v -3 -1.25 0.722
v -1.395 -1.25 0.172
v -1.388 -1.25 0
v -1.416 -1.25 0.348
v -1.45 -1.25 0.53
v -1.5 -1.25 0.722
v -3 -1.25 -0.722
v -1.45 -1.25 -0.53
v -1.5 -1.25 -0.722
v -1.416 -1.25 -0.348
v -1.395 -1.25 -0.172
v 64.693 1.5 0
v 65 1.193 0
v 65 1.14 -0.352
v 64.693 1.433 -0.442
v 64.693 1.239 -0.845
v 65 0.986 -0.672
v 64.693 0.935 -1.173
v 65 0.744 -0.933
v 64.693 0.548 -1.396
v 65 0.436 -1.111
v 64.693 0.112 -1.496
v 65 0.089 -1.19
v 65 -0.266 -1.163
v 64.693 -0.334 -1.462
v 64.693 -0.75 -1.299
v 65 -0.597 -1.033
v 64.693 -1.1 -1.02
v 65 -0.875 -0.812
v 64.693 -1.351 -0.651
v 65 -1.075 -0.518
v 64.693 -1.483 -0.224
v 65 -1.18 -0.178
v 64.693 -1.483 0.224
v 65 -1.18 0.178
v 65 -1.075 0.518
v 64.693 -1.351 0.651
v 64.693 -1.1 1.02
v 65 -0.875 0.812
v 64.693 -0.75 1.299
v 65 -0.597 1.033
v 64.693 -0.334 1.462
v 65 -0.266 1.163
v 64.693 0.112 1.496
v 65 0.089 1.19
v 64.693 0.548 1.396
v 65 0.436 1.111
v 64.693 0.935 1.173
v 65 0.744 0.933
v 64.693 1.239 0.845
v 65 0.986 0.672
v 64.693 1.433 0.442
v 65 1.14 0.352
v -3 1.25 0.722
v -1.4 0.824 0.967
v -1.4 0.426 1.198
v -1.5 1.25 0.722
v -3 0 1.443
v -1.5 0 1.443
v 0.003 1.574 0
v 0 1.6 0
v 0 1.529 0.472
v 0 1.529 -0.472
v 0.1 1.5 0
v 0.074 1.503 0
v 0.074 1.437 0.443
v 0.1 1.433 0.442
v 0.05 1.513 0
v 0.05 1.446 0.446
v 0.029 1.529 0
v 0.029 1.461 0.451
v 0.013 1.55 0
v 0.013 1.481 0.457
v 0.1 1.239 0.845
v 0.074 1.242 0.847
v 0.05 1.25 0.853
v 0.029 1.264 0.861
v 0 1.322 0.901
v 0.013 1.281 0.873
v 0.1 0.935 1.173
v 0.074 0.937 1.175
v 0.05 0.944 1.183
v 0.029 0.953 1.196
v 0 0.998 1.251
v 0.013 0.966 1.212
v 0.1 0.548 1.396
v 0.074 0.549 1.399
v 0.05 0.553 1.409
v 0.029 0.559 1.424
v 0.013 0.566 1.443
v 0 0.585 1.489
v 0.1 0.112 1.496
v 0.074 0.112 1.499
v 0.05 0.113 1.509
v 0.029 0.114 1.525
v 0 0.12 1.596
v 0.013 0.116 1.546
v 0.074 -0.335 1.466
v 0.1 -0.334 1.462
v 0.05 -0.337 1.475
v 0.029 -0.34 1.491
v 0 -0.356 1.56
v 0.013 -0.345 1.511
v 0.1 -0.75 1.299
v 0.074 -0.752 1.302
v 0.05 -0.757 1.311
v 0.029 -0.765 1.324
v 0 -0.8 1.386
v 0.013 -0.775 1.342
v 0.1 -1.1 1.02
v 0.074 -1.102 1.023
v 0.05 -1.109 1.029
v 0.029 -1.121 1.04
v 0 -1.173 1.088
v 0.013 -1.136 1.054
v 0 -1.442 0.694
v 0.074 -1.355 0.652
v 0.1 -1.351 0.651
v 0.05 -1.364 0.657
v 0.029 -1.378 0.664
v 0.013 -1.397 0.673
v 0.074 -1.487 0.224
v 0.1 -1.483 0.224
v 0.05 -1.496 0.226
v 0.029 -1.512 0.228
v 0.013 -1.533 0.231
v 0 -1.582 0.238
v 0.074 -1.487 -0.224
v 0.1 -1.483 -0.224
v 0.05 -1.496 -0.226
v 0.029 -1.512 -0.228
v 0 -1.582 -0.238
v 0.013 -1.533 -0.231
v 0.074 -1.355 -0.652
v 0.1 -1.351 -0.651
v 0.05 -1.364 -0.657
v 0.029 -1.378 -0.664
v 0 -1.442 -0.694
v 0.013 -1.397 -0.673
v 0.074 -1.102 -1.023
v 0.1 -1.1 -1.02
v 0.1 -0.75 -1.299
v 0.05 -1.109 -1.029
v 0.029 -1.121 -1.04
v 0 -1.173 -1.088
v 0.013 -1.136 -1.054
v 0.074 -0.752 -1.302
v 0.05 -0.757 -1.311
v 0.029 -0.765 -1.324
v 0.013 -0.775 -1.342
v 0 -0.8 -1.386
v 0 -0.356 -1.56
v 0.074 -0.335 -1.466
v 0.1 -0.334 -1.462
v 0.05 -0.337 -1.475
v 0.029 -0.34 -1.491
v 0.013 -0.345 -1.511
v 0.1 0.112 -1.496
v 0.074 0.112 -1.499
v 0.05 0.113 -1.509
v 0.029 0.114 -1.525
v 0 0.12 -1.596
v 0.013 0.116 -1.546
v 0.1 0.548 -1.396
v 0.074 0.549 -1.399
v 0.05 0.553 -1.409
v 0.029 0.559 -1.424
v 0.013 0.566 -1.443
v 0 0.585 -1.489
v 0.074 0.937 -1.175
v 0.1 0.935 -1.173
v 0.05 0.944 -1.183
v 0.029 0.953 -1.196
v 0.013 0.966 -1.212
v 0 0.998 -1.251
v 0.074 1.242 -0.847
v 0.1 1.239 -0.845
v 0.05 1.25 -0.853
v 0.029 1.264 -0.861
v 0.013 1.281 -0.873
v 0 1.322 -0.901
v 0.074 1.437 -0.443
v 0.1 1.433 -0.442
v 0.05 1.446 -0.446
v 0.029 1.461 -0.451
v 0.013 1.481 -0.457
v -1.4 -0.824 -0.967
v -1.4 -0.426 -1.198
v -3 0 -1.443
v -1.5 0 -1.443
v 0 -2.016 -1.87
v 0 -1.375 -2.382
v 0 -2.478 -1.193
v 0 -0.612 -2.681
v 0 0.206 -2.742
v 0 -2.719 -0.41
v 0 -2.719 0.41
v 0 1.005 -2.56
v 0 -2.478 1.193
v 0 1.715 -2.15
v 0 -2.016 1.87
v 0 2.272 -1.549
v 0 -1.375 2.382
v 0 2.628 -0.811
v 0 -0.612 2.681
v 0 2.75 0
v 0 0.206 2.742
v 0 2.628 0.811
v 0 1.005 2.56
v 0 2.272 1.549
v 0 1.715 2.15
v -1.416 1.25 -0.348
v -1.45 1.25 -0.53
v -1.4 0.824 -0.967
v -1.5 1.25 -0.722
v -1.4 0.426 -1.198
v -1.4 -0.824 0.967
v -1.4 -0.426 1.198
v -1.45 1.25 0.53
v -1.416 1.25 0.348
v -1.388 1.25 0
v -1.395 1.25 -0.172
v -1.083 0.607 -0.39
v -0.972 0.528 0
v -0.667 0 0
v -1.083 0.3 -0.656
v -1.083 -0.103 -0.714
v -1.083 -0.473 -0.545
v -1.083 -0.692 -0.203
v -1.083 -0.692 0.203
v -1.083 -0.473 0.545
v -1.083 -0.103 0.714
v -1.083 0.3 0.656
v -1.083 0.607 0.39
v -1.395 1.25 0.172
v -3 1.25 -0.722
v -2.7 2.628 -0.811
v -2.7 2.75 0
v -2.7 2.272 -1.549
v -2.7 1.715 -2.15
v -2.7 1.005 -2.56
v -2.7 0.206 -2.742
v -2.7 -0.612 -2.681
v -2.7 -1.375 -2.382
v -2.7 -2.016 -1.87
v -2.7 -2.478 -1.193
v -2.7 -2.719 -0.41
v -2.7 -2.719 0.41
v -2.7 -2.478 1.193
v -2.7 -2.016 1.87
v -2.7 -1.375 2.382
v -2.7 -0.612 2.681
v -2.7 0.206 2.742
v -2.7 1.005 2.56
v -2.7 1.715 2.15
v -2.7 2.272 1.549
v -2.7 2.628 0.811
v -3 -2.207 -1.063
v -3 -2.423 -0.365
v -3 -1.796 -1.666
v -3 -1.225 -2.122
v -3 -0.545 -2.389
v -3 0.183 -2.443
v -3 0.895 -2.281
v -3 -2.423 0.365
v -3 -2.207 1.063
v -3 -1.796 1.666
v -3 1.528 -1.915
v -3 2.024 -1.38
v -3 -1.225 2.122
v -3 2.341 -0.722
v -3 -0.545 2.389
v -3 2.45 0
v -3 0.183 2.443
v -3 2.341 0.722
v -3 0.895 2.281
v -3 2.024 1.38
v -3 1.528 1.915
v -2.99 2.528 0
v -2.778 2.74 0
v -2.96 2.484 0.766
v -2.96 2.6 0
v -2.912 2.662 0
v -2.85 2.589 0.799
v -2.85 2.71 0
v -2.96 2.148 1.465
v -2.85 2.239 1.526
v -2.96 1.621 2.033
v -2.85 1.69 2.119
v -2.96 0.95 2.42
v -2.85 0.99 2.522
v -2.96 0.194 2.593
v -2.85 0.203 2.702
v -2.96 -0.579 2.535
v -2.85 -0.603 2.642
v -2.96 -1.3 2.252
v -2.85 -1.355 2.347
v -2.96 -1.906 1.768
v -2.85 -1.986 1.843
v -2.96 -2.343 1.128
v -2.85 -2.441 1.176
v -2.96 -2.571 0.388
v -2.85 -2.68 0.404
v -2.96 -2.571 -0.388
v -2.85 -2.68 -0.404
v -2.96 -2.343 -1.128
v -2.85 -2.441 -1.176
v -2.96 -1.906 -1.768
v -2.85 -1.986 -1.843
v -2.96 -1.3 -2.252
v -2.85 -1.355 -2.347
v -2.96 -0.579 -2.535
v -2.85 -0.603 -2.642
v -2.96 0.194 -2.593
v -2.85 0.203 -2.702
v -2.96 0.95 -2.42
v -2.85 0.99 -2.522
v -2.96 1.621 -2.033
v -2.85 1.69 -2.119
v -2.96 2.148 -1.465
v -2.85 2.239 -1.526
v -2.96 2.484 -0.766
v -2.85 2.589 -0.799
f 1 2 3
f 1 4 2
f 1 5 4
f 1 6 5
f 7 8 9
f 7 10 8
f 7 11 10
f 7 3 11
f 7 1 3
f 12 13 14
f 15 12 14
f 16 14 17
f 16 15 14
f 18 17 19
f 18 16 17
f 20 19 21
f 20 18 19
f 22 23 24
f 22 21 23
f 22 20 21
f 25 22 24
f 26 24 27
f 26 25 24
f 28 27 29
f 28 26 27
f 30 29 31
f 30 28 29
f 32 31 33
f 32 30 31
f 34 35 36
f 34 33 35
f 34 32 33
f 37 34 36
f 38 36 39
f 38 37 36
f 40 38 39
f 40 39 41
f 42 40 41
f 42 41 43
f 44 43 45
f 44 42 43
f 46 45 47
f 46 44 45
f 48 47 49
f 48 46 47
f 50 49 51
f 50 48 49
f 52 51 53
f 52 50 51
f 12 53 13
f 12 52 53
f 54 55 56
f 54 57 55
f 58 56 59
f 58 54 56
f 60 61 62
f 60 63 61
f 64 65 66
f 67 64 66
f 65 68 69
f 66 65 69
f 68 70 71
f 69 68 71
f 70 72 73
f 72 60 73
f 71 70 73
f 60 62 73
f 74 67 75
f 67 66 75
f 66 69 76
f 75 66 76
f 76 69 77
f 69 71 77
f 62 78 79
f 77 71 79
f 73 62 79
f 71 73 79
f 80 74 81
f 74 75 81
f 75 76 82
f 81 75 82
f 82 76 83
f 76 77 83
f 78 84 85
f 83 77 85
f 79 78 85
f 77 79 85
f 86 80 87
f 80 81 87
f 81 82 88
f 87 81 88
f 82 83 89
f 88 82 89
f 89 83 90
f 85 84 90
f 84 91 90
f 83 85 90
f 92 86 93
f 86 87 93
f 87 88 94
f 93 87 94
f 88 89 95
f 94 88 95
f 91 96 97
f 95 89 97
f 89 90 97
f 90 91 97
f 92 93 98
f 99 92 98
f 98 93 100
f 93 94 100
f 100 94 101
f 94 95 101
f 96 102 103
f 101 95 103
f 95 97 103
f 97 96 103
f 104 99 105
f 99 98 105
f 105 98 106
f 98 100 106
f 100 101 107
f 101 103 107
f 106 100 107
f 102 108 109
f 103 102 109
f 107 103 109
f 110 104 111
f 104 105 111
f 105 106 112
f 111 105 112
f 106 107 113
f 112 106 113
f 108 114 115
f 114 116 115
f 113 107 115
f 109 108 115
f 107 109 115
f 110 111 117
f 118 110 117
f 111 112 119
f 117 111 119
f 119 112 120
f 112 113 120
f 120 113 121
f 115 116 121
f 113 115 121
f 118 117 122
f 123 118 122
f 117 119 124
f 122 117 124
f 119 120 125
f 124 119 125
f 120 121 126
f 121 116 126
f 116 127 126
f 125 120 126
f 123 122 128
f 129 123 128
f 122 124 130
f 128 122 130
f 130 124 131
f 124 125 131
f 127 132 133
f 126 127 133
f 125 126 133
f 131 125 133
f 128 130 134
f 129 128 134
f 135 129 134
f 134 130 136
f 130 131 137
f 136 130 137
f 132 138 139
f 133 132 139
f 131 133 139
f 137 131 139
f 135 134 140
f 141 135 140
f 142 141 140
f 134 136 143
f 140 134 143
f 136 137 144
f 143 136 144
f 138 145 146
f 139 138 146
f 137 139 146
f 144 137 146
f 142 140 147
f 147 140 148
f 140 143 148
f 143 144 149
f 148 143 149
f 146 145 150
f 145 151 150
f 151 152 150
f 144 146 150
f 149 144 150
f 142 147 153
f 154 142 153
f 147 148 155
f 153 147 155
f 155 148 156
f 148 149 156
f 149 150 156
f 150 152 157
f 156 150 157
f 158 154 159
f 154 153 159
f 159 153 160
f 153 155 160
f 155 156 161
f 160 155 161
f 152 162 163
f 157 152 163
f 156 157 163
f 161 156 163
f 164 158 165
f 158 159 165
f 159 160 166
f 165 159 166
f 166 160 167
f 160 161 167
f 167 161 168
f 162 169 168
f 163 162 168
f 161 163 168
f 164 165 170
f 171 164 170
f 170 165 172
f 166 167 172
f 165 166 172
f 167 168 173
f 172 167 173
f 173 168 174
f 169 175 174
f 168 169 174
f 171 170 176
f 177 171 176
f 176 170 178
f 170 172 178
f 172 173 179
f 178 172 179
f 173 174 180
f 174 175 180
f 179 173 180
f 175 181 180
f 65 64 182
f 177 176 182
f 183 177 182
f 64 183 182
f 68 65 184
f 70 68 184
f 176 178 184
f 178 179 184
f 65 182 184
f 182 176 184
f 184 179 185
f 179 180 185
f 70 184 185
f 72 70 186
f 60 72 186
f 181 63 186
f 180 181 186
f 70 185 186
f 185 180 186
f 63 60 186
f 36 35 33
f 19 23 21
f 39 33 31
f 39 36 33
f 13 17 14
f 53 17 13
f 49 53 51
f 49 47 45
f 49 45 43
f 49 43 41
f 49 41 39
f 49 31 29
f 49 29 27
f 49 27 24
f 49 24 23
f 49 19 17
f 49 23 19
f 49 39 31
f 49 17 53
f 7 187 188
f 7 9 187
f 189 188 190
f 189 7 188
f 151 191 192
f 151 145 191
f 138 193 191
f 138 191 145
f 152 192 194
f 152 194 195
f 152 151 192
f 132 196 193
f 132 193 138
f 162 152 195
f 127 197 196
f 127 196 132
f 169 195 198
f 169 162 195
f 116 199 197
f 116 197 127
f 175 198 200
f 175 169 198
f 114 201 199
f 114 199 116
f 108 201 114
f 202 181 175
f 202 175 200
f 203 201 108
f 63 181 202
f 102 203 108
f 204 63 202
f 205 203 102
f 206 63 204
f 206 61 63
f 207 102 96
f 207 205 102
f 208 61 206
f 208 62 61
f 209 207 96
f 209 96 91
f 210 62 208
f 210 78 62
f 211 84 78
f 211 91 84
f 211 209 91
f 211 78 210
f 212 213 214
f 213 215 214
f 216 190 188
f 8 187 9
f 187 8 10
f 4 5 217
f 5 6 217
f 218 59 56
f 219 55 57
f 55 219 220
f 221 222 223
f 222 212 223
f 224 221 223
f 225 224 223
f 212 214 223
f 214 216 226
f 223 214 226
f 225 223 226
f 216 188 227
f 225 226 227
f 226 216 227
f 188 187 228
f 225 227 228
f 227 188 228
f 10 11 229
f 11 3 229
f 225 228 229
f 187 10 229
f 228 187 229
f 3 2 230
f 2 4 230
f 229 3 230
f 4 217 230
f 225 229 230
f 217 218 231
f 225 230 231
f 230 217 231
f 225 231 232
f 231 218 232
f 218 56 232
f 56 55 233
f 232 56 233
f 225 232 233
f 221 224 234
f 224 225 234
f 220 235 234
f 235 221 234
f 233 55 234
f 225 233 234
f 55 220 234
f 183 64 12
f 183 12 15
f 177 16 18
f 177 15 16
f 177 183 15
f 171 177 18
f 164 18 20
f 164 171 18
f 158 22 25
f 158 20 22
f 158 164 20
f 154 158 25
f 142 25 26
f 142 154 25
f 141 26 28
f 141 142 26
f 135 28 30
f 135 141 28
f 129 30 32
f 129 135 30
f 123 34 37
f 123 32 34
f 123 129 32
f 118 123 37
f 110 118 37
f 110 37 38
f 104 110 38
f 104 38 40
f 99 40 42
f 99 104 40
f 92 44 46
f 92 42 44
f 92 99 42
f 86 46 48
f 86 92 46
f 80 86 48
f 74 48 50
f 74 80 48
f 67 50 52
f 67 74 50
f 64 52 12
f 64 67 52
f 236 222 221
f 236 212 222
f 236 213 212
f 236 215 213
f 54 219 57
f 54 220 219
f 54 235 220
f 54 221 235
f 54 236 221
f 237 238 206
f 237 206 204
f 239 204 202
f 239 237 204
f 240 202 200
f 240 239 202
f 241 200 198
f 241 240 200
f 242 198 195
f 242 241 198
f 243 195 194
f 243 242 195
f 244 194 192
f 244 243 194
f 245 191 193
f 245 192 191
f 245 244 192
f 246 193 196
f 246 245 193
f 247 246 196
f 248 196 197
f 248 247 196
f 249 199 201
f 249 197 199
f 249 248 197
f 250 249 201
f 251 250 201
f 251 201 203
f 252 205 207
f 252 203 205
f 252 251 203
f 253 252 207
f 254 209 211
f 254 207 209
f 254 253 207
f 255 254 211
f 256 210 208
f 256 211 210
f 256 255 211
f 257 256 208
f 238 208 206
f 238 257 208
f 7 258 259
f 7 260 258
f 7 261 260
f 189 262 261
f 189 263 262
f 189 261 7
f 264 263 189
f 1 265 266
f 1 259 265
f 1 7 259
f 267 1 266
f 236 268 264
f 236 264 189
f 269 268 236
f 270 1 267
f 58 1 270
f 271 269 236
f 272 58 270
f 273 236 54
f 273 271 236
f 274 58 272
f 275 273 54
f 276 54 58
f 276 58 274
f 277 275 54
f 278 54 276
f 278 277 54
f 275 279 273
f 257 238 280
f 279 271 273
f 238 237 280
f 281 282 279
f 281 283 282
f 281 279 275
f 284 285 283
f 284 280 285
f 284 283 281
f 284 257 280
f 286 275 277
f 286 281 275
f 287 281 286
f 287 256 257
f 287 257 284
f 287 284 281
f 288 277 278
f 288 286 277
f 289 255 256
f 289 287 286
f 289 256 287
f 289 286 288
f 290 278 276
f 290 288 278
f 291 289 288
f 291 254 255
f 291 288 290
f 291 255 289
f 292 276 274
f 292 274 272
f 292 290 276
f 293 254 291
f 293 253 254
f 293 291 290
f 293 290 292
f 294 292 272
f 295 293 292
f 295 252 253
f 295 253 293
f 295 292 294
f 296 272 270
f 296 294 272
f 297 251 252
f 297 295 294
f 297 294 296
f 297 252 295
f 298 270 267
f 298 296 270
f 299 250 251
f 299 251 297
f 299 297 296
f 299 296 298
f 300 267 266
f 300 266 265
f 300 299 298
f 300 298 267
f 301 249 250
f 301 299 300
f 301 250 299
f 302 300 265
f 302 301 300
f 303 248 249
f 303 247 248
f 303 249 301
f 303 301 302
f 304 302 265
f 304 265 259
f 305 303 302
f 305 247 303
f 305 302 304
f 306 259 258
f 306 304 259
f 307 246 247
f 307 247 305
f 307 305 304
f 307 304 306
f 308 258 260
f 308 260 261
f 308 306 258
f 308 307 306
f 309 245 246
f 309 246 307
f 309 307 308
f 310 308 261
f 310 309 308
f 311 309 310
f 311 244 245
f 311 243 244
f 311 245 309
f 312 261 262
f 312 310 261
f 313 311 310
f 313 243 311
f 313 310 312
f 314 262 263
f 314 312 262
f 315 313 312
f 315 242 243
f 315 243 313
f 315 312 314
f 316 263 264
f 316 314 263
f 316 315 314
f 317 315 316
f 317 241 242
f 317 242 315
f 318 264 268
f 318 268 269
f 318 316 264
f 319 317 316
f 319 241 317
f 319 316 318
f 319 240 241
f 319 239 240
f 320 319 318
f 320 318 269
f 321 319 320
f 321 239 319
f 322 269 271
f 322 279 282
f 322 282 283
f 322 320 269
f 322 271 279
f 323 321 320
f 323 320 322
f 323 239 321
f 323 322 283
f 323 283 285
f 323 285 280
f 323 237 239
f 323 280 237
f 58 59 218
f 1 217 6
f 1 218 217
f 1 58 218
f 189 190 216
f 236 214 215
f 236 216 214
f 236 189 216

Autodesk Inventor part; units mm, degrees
ref_plane "YZ Plane" through (0, 0, 0) normal (1, 0, 0) x (0, 1, 0)
ref_plane "XZ Plane" through (0, 0, 0) normal (0, 1, 0) x (-1, 0, 0)
sketch "Sketch1" plane through (0, 0, 0) normal (0, 0, 1) x (1, 0, 0)
  line L0 (-0.6667, 0) -> (65, 0)
  line L1 (65, 0) -> (65, 1.5)
  line L2 (65, 1.5) -> (47, 1.5)
  line L3 (47, 1.5) -> (46.6932, 1.5)
  line L4 (46.6932, 1.5) -> (0, 1.5)
  line L5 (0, 1.5) -> (0, 2.75)
  line L6 (0, 2.75) -> (-3, 2.75)
  line L7 (-3, 2.75) -> (-3, 1.4434)
  line L8 (-3, 1.4434) -> (-1.5, 1.4434)
  line L9 (-1.5, 1.4434) -> (-0.6667, 0)
  line L10 (-16.6, 0) -> (78.6, 0) projected
  line L11 (0, -0.55) -> (0, 3.3) projected
  line L12 (47, 1.5) -> (0, 1.5) construction
  dimension "d1" = 18
  dimension "d2" = 0.3068
  dimension "d3" = 3
  dimension "d4" = 1.5
  dimension "d5" = 60
  dimension "d6" = 3
  dimension "d7" = 3
  dimension "d8" = 2.8868
  dimension "d9" = 5.5
  dimension "d26" = 65
revolve "Body" add sketch "Sketch1" angle 360 about axis through (-0.6667, 0, 0) along (1, 0, 0)
sketch "Sketch2" plane through (-3, 0, 0) normal (-1, 0, 0) x (0, 0, 1)
  circle A0 centre (0, 0) radius 1.4434 projected
  line L0 (0, -3.85) -> (0, 3.85) projected
  line L1 (-3.85, 0) -> (3.85, 0) projected
  line L2 (1.4434, 0) -> (0.7217, -1.25)
  line L3 (0.7217, -1.25) -> (-0.7217, -1.25)
  line L4 (-0.7217, -1.25) -> (-1.4434, 0)
  line L5 (-1.4434, 0) -> (-0.7217, 1.25)
  line L6 (-0.7217, 1.25) -> (0.7217, 1.25)
  line L7 (0.7217, 1.25) -> (1.4434, 0)
extrude "Slot" add sketch "Sketch2" against normal up to next contours L7 A0 | A0 L2 | L6 L0 A0 | A0 L0 L3 | L0 L6 A0 | A0 L3 L0 | L4 A0 | A0 L5
fillet "Fillet1" radius 0.3 1 edges at (-3, -2.75, 0)
thread "Thread" size "M3x0.5" class "6g" standard "ISO Metric profile" length 18
chamfer "Chamfer1" distance 0.3067 distance2 0.3067 1 edges at (65, -1.5, 0) measured on face at (65, -0.92, -0.2845)
ref_plane "Work Plane1" through (29, 0, 0) normal (0, -1, 0) x (1, 0, 0)
fillet "Fillet2" radius 0.1 1 edges at (0, -1.5, 0)
equation "\"d1\" = GEL"
equation "\"d3\" = KOH"
equation "\"d4\" = INTI"
equation "\"d6\" = GD"
equation "\"d7\" = BDM"
equation "\"d8\" = 1.1547 * SW"
equation "\"d9\" = KOD"
equation "\"d26\" = NLG"
equation "\"d30\" = R"
equation "\"d17\" = RR"
equation "\"d13\" = GEL"
equation "\"d15\" = -0.5 * SPD + 0.5 * GD"
equation "\"d16\" = GUL"
equation "\"GD\" = NND"
equation "\"NLG\" = 65"
equation "\"GEL\" = 18"
equation "\"KOD\" = 5.5"
equation "\"KOH\" = 3"
equation "\"INTI\" = 1.5"
equation "\"GAL\" = 0.61345 * PTC"
equation "\"GUL\" = 0.61345 * PTC"
equation "\"BDM\" = NND"
equation "\"SW\" = 2.5"
equation "\"RR\" = 0.3"
equation "\"SPD\" = 2.38655"
equation "\"R\" = 0.1"
equation "\"TOA\" = 30deg"
equation "\"THREADDIA\" = 3"
equation "\"PTC\" = 0.5"
equation "\"NND\" = 3"
equation "\"E0\" = 1.155 * SW"
equation "\"GD1\" = THREADDIA - 1.2269 * PTC"
properties part number "ANSI B18.3.1M - M3x0.5 x 65" material "Steel, Mild"
